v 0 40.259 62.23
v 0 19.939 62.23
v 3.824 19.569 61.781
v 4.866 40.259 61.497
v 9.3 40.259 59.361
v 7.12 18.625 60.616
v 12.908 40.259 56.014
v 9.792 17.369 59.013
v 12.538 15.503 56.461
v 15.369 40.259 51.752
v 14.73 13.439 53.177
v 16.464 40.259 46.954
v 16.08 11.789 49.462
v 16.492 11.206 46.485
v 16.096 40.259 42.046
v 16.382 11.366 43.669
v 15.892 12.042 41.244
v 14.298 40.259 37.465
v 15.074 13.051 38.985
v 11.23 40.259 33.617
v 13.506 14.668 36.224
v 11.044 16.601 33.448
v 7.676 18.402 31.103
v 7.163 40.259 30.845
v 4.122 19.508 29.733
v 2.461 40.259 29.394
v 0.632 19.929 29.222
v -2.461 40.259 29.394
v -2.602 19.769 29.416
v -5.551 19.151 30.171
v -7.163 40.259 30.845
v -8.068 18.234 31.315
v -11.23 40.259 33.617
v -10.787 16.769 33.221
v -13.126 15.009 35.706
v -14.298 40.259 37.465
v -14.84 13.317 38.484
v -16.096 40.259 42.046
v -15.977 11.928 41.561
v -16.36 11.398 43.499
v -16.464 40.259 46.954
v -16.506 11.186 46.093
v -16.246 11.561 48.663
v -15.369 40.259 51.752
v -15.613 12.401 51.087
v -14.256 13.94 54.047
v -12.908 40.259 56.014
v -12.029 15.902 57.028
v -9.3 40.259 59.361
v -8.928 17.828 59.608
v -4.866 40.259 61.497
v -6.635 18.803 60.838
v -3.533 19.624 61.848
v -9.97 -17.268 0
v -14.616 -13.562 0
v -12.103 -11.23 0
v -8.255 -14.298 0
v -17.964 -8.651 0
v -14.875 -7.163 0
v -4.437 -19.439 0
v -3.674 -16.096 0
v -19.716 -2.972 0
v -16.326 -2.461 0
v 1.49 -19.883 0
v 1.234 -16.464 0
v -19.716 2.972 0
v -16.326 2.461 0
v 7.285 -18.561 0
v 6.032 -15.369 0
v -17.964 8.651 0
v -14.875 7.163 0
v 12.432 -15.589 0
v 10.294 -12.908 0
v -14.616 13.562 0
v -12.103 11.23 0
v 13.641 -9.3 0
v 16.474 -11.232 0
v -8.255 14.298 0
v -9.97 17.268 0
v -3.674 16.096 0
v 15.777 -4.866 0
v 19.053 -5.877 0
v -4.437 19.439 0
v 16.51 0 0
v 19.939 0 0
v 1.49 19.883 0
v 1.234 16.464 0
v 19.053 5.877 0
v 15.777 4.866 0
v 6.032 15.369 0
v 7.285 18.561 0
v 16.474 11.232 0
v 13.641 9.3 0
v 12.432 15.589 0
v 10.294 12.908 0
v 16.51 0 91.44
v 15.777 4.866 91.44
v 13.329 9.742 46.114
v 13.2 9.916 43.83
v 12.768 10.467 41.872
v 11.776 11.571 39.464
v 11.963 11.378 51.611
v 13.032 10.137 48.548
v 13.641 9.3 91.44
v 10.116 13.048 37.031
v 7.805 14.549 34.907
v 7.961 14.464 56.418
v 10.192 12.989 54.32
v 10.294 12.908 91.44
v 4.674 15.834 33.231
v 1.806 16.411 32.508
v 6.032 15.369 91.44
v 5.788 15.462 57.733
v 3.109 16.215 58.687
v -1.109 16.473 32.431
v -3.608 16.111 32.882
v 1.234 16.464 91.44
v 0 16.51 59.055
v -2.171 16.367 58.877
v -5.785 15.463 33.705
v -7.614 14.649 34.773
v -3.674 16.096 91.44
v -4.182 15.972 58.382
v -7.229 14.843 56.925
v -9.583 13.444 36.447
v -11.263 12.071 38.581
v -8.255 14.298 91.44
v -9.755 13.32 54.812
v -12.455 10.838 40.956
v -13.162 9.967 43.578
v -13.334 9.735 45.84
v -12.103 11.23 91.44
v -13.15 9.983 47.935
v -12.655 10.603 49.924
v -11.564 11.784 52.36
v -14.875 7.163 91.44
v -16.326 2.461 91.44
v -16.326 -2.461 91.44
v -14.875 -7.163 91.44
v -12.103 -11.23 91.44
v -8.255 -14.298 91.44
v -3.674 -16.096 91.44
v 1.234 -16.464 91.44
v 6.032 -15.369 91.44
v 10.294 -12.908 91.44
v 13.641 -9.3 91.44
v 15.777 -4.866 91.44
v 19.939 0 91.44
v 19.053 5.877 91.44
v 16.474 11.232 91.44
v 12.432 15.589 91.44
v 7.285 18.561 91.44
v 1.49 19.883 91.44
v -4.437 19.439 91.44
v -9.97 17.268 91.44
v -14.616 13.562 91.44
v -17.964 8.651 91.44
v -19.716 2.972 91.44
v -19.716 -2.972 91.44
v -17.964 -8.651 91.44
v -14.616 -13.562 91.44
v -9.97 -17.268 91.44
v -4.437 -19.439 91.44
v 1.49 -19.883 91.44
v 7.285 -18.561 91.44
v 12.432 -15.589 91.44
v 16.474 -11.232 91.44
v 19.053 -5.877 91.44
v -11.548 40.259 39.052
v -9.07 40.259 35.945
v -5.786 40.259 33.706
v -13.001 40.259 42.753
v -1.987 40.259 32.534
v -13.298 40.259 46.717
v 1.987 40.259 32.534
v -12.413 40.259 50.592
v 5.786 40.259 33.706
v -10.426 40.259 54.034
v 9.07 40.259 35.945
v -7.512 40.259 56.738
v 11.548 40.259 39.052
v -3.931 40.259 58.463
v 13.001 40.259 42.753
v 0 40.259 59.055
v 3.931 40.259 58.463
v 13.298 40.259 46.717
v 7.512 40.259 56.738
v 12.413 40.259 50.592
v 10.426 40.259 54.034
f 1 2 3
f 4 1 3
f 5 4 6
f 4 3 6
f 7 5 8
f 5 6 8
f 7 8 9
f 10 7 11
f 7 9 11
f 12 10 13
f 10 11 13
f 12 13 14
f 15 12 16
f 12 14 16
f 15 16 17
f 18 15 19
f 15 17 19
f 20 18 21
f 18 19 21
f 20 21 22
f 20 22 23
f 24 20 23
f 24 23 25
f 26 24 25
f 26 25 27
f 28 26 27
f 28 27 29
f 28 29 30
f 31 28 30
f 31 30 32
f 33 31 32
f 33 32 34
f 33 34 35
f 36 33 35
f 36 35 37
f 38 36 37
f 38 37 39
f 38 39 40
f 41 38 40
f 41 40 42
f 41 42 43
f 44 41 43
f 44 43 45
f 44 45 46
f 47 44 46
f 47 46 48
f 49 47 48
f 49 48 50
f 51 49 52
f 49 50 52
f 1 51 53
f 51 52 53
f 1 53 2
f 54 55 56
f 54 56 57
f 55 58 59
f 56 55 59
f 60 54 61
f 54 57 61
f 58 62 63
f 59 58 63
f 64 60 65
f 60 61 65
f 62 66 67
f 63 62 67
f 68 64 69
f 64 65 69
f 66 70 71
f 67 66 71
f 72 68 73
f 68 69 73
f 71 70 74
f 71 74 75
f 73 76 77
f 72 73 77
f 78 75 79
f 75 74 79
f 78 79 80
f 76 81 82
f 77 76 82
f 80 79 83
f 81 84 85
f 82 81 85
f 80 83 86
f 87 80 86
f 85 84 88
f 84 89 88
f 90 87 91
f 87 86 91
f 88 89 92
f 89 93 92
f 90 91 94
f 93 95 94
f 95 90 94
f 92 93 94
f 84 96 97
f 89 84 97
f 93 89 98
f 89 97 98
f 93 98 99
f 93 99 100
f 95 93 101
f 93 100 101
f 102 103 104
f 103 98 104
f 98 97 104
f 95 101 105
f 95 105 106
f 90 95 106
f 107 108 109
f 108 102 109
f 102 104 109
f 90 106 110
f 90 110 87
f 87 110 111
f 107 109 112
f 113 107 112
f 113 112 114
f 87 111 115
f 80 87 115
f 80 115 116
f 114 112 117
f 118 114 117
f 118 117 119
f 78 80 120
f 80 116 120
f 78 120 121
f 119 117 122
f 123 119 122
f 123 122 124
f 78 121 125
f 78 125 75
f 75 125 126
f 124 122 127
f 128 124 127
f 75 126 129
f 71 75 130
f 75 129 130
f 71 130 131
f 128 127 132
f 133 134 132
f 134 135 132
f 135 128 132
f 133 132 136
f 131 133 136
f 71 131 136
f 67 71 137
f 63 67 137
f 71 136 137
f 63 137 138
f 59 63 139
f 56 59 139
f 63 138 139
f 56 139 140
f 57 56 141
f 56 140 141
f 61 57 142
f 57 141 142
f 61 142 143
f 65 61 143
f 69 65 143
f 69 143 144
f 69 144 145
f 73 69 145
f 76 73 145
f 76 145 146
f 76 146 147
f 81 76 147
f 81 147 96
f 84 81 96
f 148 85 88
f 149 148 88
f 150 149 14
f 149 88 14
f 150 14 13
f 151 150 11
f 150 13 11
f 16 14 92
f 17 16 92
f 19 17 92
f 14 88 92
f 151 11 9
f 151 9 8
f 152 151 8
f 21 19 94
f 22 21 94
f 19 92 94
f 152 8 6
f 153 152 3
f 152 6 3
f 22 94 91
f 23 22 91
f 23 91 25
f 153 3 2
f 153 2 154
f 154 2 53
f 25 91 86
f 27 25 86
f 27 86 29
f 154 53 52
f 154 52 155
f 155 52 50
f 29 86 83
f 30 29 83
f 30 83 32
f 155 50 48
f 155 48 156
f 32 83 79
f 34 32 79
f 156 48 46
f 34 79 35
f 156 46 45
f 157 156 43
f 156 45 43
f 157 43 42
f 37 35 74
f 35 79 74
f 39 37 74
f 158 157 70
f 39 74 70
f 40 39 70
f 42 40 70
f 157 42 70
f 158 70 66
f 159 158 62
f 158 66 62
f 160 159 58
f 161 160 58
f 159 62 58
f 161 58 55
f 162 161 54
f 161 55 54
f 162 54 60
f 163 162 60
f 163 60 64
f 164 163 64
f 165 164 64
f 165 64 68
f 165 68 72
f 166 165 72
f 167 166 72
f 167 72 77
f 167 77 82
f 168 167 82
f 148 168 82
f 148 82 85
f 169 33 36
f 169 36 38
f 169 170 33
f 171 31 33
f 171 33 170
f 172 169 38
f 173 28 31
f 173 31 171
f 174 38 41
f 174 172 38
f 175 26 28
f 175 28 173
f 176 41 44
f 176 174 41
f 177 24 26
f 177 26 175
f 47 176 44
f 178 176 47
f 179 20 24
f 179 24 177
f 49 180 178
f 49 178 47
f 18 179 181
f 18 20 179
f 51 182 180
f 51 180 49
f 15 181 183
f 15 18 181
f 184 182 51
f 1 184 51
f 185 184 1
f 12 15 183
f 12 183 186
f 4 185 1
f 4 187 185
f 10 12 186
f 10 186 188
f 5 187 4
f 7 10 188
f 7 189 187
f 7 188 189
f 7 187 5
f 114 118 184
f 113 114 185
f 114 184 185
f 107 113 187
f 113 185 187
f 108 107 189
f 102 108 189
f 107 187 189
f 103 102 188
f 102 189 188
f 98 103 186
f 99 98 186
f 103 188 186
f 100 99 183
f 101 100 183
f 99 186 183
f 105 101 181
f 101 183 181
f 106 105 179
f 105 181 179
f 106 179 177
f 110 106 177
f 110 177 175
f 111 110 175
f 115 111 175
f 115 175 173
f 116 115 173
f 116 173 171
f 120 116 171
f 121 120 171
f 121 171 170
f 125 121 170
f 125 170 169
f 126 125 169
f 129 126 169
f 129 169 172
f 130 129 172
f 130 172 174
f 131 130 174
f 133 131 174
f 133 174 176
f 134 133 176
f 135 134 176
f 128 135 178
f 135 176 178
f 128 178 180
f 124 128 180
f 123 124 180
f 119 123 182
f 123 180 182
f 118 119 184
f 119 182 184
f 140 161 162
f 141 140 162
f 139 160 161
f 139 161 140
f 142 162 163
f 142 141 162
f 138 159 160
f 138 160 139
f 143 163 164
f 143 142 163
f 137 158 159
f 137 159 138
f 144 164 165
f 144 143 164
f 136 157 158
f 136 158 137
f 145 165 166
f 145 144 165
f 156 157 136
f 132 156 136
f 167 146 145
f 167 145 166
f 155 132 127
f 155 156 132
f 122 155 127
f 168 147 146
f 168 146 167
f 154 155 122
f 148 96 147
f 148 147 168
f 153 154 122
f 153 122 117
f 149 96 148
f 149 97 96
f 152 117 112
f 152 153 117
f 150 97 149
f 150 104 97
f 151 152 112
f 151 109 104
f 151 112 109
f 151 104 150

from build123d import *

# Parameters (mm, degrees)
SKETCH1_R                = 19.939
BOSS_EXTRUDE1_DEPTH      = 91.44
BOSS_EXTRUDE2_DEPTH      = 20.32
BOSS_EXTRUDE2_DEPTH_BACK = 20.32
SKETCH3_R                = 16.51
SKETCH4_R                = 16.51
CUT_EXTRUDE1_DEPTH       = 102.880441814
CUT_EXTRUDE2_REACH       = 113.277
CUT_EXTRUDE2_END_RADIUS  = 16.51
SKETCH5_R                = 13.335


with BuildPart() as part:
    # Sketch1 → Boss-Extrude1 (new body)
    with BuildSketch(Plane.XY):
        Circle(SKETCH1_R)
    extrude(amount=BOSS_EXTRUDE1_DEPTH)

    # Sketch3 → Boss-Extrude2 (add, two sides: drawn at the far end of the back side and taken through both)
    with BuildSketch(Plane(origin=(0, 19.939, 0), x_dir=(1, 0, 0), z_dir=(0, 1, 0)).offset(-BOSS_EXTRUDE2_DEPTH_BACK)):
        with Locations(Location((0, -45.72, 0), (0, 0, 270))):
            Circle(SKETCH3_R)
    extrude(amount=BOSS_EXTRUDE2_DEPTH + BOSS_EXTRUDE2_DEPTH_BACK)

    # Sketch4 → Cut-Extrude1 (cut, through all)
    with BuildSketch(Plane.XY.offset(91.44)):
        Circle(SKETCH4_R)
    extrude(amount=-CUT_EXTRUDE1_DEPTH, mode=Mode.SUBTRACT)

    # Cut-Extrude2: up to this cylinder (the profile starts outside it)
    cut_extrude2_end = Plane(origin=(0, 0, 45.72), z_dir=(0, 0, 1)) * Cylinder(CUT_EXTRUDE2_END_RADIUS, 260.574, mode=Mode.PRIVATE)
    # Sketch5 → Cut-Extrude2 (cut, up to the surface)
    with BuildSketch(Plane(origin=(0, 40.259, 0), x_dir=(1, 0, 0), z_dir=(0, 1, 0)), mode=Mode.PRIVATE) as cut_extrude2_sk1:
        with Locations(Location((0, -45.72, 0), (0, 0, 270))):
            Circle(SKETCH5_R)
    cut_extrude2_tool1 = extrude(cut_extrude2_sk1.sketch, amount=-CUT_EXTRUDE2_REACH, mode=Mode.PRIVATE) - cut_extrude2_end
    add(cut_extrude2_tool1.solids().sort_by_distance((0, 40.259, 45.72))[0], mode=Mode.SUBTRACT)


solid = part.part
